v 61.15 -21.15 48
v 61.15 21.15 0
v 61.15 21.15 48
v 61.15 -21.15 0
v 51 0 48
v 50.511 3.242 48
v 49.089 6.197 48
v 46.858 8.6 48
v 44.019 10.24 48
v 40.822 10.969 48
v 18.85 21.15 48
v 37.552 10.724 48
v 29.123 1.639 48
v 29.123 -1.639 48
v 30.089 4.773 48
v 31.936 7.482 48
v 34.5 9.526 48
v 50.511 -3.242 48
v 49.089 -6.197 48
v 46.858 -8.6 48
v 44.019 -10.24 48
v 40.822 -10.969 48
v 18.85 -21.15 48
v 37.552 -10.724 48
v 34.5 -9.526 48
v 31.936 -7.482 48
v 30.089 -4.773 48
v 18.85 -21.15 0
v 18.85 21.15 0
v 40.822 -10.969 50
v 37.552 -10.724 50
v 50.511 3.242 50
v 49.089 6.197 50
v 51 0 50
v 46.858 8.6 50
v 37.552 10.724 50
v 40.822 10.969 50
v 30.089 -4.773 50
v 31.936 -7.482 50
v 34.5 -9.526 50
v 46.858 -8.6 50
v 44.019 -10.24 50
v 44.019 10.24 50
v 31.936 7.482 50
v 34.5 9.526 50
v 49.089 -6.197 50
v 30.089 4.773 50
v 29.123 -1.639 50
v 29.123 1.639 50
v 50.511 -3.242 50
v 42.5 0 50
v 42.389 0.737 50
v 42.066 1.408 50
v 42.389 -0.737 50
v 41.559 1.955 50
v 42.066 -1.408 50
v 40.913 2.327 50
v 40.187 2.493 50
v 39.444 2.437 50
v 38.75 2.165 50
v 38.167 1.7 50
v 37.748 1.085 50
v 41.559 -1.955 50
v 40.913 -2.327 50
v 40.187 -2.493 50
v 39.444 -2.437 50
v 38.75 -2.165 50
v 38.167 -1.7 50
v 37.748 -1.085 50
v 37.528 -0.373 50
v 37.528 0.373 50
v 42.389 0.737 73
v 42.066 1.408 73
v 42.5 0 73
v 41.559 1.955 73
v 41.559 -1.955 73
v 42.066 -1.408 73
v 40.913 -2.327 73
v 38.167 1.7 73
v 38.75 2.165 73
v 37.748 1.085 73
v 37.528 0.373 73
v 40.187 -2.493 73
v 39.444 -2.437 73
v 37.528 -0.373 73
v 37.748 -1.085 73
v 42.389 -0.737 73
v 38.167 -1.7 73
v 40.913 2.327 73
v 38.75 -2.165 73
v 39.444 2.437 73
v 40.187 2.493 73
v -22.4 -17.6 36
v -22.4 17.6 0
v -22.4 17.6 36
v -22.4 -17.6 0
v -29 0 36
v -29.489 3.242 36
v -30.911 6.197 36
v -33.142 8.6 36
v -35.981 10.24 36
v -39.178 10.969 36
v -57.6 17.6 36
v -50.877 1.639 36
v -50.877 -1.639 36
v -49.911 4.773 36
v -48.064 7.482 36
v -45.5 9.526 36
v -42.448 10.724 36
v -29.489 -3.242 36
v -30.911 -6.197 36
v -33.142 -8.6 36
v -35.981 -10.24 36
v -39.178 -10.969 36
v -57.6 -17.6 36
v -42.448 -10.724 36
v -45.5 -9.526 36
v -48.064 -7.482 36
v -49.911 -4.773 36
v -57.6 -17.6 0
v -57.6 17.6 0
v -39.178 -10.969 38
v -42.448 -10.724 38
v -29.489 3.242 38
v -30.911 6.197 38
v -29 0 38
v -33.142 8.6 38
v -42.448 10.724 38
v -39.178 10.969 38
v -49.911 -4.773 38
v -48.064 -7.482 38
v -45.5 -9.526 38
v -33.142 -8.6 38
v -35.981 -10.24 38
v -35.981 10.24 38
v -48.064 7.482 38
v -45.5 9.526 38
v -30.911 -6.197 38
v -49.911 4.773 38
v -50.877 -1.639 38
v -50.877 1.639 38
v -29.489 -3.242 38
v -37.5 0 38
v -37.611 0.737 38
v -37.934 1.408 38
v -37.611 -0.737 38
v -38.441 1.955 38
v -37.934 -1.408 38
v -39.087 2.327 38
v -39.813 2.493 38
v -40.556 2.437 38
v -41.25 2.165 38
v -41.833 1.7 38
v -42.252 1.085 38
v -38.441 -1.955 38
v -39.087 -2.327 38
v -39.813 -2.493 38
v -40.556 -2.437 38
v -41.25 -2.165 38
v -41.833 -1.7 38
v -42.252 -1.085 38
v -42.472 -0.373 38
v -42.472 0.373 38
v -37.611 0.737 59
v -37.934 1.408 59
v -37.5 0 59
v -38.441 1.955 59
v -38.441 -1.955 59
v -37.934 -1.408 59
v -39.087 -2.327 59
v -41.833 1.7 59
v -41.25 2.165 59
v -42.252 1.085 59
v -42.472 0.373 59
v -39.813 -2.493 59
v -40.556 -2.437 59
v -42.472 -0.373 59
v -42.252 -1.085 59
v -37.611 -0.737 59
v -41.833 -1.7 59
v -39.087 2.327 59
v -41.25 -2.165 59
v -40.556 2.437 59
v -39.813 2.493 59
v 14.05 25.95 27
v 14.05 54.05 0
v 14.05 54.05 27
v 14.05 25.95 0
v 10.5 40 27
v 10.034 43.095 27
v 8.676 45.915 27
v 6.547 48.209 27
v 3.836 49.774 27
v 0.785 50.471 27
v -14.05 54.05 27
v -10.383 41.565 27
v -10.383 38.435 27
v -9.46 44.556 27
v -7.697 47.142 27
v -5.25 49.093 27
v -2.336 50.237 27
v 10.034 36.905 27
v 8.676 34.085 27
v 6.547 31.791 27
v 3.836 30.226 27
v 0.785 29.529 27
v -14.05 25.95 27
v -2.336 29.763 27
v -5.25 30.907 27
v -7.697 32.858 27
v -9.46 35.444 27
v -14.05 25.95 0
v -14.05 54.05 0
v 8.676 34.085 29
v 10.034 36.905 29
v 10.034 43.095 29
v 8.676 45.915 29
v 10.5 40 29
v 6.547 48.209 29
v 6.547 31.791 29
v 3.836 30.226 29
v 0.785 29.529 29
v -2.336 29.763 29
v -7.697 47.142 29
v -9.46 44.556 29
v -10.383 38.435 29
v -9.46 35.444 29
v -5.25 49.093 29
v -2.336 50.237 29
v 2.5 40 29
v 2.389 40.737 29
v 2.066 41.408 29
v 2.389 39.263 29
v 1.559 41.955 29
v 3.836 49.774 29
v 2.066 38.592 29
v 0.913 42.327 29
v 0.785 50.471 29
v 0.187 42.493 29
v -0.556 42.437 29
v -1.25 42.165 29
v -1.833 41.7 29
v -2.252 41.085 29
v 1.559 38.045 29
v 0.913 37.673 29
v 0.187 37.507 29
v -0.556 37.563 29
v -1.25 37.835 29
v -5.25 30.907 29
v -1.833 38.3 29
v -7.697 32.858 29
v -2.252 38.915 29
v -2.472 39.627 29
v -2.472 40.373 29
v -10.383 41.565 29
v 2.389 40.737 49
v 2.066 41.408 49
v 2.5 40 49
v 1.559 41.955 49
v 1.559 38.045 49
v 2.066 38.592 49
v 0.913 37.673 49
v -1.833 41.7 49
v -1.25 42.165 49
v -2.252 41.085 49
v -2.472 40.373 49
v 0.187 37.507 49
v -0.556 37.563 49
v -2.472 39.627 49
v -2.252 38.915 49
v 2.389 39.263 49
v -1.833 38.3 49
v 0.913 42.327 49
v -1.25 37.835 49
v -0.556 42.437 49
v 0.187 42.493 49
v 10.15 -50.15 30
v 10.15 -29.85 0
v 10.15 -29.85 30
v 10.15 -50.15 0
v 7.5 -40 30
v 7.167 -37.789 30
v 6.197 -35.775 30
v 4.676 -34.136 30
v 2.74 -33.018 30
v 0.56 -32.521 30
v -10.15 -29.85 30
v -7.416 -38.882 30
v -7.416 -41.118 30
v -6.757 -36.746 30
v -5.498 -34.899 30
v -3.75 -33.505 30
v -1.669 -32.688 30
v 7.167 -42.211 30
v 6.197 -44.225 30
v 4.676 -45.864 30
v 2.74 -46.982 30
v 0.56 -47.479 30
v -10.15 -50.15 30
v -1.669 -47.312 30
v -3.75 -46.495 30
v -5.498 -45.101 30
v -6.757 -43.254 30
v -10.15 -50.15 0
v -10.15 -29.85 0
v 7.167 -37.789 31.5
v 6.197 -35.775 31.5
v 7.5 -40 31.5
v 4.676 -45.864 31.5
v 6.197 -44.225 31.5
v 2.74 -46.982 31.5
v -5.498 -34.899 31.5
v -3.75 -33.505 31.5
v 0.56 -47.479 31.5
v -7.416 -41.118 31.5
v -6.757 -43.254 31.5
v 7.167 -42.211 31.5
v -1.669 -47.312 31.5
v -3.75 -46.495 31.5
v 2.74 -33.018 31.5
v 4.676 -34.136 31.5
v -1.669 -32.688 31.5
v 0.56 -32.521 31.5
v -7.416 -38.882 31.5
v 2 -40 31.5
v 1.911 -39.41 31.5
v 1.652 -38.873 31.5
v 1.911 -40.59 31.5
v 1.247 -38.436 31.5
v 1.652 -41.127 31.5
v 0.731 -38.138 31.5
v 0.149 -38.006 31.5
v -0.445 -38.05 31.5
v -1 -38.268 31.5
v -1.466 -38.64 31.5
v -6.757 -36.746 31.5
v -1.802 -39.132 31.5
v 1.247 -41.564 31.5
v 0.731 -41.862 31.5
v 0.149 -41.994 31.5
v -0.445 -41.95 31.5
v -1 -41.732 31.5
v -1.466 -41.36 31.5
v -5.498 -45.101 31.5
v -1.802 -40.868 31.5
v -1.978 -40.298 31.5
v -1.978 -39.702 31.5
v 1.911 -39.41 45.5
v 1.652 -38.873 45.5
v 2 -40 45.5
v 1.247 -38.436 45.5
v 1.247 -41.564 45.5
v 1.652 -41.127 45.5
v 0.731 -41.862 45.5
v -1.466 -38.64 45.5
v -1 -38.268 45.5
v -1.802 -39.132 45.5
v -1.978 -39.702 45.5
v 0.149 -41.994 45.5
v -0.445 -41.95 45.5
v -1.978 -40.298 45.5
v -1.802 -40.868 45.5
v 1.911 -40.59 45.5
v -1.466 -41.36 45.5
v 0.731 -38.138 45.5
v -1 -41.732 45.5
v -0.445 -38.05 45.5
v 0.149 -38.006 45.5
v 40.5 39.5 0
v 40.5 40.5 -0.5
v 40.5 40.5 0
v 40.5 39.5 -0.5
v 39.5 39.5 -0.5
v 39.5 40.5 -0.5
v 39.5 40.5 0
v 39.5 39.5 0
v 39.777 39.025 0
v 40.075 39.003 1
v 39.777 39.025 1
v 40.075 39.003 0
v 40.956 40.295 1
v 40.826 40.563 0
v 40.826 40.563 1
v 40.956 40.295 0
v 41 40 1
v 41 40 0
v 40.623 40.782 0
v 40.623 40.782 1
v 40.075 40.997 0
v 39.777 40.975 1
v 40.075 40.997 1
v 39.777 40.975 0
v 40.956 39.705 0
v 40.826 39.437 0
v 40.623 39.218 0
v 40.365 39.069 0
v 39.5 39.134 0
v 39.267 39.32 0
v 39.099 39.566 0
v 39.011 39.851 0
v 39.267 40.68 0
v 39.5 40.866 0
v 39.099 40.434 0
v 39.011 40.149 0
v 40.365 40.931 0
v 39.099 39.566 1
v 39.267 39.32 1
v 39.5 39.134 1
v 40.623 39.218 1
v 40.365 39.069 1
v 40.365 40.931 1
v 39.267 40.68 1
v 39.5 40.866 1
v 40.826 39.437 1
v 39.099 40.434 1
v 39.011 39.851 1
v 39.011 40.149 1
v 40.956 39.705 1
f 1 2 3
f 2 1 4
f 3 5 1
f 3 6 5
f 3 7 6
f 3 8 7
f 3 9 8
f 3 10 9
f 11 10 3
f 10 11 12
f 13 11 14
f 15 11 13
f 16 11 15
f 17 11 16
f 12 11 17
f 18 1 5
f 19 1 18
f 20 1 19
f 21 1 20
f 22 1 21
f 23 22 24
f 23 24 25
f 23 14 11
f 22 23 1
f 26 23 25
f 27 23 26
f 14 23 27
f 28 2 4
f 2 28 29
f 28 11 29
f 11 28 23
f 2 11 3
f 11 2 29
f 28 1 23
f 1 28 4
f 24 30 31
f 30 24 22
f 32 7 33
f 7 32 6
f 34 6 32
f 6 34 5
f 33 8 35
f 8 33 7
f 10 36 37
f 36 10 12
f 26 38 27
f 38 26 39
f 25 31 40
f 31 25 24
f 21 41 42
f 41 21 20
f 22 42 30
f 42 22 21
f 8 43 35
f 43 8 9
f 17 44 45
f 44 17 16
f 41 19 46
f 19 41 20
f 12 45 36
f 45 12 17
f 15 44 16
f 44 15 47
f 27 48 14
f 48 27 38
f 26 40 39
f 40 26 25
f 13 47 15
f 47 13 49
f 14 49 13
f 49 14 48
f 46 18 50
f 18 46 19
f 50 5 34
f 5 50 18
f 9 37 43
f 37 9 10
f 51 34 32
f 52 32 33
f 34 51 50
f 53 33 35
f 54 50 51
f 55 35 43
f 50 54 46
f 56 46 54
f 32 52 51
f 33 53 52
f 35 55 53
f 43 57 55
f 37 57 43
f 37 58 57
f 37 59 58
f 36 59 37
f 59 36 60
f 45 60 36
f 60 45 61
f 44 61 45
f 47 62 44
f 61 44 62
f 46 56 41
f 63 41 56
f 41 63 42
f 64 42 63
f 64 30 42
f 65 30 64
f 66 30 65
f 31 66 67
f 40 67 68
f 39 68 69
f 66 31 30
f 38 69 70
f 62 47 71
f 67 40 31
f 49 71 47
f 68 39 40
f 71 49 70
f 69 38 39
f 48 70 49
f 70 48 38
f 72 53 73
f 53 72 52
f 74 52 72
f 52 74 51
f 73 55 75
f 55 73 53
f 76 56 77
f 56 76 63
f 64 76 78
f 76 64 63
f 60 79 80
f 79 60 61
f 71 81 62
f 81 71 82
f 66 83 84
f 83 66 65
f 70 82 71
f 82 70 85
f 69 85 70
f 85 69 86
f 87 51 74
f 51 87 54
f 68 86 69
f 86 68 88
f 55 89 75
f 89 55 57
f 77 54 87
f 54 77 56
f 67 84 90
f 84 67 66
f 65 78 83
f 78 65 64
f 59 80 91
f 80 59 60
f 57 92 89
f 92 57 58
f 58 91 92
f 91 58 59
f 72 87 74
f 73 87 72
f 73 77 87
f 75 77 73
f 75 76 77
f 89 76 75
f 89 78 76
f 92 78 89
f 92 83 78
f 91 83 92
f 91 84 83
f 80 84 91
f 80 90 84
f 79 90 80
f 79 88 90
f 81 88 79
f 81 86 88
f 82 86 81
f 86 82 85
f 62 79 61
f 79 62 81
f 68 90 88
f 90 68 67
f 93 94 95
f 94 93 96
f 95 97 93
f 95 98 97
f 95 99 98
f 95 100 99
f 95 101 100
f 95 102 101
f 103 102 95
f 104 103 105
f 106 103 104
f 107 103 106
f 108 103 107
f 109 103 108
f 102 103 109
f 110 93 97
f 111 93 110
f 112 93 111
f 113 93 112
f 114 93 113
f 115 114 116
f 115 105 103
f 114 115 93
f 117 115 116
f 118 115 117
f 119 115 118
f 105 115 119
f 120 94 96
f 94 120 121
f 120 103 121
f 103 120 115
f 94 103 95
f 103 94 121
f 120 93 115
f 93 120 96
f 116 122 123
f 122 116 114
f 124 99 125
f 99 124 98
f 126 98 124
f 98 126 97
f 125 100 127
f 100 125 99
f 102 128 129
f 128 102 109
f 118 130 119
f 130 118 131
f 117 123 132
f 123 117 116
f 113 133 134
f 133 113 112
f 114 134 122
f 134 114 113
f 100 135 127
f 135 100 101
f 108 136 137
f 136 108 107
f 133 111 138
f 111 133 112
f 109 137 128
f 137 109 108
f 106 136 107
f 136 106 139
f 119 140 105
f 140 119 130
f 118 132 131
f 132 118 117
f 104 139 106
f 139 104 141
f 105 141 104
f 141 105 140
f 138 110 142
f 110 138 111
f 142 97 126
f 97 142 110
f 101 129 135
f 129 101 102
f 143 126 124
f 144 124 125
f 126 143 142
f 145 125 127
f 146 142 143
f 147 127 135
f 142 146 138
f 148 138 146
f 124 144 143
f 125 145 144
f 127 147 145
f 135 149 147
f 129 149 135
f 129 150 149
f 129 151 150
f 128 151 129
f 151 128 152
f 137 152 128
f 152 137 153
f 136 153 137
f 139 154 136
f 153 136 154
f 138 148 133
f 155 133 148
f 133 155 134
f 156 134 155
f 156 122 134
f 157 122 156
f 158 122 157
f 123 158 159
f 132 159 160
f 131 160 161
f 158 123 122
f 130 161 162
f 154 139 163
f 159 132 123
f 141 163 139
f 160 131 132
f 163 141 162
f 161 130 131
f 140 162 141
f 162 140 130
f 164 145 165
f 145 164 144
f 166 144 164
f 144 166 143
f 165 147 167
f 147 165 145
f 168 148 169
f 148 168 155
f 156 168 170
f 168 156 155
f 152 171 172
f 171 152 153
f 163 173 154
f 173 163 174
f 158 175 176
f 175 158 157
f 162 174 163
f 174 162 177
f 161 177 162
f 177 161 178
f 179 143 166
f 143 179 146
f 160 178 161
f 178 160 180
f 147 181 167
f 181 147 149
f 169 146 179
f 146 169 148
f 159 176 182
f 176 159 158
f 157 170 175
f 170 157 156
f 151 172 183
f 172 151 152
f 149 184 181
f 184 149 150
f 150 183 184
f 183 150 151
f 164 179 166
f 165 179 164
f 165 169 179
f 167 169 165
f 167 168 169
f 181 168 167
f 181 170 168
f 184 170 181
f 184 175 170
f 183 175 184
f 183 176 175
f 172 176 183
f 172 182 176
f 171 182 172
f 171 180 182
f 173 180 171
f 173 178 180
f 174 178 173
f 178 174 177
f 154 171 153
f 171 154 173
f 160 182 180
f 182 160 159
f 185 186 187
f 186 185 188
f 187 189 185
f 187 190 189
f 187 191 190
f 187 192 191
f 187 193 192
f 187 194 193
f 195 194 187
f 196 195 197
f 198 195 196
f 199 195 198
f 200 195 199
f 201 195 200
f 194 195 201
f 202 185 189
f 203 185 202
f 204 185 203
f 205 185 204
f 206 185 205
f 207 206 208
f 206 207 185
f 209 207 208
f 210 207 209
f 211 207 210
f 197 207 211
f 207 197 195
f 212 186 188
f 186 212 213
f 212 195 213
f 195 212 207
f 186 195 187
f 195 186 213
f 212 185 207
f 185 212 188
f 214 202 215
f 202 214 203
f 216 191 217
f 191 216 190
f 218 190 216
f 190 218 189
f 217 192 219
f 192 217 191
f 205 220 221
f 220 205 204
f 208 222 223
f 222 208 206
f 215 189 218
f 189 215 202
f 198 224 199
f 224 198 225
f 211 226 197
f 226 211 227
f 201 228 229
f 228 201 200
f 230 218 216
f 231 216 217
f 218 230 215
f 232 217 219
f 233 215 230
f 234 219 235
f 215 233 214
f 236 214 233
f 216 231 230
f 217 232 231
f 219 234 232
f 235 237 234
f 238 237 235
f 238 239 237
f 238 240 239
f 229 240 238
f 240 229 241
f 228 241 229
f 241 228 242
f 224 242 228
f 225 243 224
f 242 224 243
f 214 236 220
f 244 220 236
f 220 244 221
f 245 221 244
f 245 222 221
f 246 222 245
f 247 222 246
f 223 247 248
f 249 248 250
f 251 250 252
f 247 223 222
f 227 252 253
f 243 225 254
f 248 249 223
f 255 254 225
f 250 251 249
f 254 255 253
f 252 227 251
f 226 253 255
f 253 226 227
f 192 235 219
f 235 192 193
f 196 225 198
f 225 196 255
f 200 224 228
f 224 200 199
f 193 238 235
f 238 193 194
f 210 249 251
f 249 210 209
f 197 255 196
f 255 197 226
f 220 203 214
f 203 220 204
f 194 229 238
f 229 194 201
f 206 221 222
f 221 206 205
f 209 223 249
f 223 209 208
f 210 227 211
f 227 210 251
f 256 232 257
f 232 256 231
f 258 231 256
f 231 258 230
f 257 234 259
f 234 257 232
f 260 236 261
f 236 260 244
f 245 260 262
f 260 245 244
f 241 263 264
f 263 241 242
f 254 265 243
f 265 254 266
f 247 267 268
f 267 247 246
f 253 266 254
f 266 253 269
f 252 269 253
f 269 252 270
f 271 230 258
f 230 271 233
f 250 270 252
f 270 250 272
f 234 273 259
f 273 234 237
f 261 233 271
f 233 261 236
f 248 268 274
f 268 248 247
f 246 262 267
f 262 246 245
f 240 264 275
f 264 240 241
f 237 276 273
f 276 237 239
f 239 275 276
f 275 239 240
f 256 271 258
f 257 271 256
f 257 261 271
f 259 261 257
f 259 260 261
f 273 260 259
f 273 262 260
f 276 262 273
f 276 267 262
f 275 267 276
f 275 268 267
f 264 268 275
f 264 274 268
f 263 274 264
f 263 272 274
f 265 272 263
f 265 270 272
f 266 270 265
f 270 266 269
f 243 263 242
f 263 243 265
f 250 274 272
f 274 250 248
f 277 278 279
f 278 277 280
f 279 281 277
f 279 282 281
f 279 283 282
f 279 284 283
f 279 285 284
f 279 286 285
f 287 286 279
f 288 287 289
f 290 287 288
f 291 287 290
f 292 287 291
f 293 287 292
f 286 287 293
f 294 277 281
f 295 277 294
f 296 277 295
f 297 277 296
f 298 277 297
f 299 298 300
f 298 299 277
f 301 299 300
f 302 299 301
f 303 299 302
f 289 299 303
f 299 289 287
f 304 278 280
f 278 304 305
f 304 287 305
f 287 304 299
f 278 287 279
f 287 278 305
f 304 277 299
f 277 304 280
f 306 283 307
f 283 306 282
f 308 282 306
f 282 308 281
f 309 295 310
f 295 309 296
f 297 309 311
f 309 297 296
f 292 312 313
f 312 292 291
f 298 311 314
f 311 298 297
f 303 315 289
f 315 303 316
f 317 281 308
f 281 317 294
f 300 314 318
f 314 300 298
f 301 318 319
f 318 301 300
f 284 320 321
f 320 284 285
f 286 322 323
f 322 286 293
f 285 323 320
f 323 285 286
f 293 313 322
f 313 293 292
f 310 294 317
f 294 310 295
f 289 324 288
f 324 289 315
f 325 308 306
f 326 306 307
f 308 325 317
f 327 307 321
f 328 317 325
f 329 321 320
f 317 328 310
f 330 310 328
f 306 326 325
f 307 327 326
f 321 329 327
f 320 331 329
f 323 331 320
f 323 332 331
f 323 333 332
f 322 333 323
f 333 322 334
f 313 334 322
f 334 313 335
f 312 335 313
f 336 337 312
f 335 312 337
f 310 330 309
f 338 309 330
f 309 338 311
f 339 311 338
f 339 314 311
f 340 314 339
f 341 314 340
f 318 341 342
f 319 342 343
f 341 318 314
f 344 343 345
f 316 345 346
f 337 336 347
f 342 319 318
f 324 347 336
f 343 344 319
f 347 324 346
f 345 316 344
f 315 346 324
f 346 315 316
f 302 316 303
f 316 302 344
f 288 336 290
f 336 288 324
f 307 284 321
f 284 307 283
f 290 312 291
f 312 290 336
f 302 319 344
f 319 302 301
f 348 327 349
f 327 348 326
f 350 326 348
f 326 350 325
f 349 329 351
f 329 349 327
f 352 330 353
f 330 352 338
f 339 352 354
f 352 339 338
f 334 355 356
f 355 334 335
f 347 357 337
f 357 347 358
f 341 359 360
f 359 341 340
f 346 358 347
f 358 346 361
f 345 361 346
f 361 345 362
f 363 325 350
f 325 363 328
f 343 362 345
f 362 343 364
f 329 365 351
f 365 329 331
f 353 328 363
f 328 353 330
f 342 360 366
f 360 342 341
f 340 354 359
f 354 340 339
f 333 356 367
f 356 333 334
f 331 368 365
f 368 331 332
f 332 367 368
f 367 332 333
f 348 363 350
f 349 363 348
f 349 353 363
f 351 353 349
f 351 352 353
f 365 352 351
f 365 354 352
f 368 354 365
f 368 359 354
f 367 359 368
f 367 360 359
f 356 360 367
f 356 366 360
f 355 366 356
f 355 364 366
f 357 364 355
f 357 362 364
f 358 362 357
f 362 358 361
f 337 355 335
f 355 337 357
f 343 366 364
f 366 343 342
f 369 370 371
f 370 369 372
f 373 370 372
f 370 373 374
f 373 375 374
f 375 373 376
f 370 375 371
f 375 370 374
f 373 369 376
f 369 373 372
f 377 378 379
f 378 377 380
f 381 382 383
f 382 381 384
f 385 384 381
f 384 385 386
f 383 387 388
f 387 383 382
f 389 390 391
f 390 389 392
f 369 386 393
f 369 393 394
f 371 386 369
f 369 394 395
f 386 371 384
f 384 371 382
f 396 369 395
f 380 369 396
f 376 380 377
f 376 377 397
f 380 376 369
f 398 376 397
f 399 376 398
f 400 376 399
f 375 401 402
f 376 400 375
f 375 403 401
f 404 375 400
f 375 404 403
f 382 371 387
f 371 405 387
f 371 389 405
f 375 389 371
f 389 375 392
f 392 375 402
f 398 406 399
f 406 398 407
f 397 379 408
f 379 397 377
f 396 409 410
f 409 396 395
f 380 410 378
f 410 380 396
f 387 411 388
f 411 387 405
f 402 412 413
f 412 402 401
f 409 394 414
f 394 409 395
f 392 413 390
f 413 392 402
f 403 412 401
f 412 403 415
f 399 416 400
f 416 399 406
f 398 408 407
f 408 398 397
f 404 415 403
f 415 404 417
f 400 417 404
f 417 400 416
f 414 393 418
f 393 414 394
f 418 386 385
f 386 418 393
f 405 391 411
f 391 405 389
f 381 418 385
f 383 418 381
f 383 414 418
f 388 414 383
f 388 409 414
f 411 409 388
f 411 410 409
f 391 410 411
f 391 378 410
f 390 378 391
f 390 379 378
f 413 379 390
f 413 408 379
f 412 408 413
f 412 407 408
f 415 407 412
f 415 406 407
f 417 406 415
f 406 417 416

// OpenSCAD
// file: ../scad/materials.scad
module aluminium(){
	color([1,1,1]*0.95) for(i=[1:$children]) child(i-1);
}
module aluminum(){
	color([1,1,1]*0.95) for(i=[1:$children]) child(i-1);
}
module bzp(){
    color([0.7,0.7,1]) for(i=[1:$children]) child(i-1);
}
module stainless(){
    color([1,1,1]*0.6) for(i=[1:$children]) child(i-1);
}
module steel(){
    color([1,1,1]*0.5) for(i=[1:$children]) child(i-1);
}
module urethane(){
    color([166/255,119/255,73/255]) for(i=[1:$children]) child(i-1);
}
// file: ../scad/functions.scad
include <hardware_dims.scad>

// Assign Screw array
function getScrewDims(screw) = (screw=="M2") ? m2 : (screw=="M2.5") ? m2_5 : (screw=="M3") ? m3 : (screw=="M4") ? m4 : (screw=="M5") ? m5 : (screw=="M6") ? m6 : (screw=="M8") ? m8 : "error";

function get_screw_dims(screw) = getScrewDims(screw);

function getStepperDims(motor) = (motor=="NEMA8") ? nema8 : (motor=="NEMA11") ? nema11 : (motor=="NEMA14") ? nema14 : (motor=="NEMA17") ? nema17 : (motor=="Pololu 35x26") ? pololu35x26 :"error";

function get_stepper_dims(motor) = getStepperDims(motor);

function getElectronicsHoles(electronics) = (electronics=="Melzi") ? melzi : (electronics=="Mega") ? mega : (electronics=="Printrboard") ? printrboard : (electronics=="Sanguinololu") ? sanguinololu :"error";

function get_electronics_holes(electronics) = getElectronicsHoles(electronics);

function getExtruderGearDims(extruderGear) = (extruderGear=="Arcol8x5") ? arcol8x5 : (extruderGear=="Arcol11x8") ? arcol11x8 : (extruderGear=="Arcol11x5") ? arcol11x5 : (extruderGear=="Arcol13x8") ? arcol13x8 : "error";

function get_extruder_gear_dims(extruderGear) = getExtruderGearDims(extruderGear);

function get_drive_roller_dims(roller) = (roller == "A_7T_5MUR1405") ? A_7T_5MUR1405 : (roller == "A_7T_5MUR1606") ? A_7T_5MUR1606 : (roller == "A_7T_5MUR1905") ? A_7T_5MUR1905 : (roller == "A_7T_5MUR1906") ? A_7T_5MUR1906 : (roller == "A_7T_5MUR2206") ? A_7T_5MUR2206 : (roller == "A_7T_5MUR2510") ? A_7T_5MUR2510 : (roller == "A_7T_5MUR3210") ? A_7T_5MUR3210 : (roller == "A_7T_5MUR3810") ? A_7T_5MUR3810 : (roller == "A_7T_5MUR3812") ? A_7T_5MUR3812 : (roller == "A_7T_5MUR4412") ? A_7T_5MUR4412 : (roller == "A_7T_5MUR5012") ? A_7T_5MUR5012 : (roller == "A_7M_5MUR1206A") ? A_7M_5MUR1206A : (roller == "A_7M_5MUR1206B") ? A_7M_5MUR1206B : "error";
// file: ../scad/hardware_dims.scad
//Screw Dimension arrays
//[Diameter, Cap Head Height, Head Diameter, nut across flats, lock nut height, nut height, washer od, washer thick, pan head diameter]
m2 = [2, 2, 3.8, 4, 2.8, 1.6, 5, 0.3, 4];
m2_5 = [2.5, 2.5, 4.5, 5, 3.8, 2, 6, 0.5, 5];
m3 = [3, 3, 5.5, 5.5, 4, 2.4, 7, 0.6, 6];
m4 = [4, 4, 7, 7, 5, 3.2, 9, 0.9, 8];
m5 = [5, 5, 8.5, 8, 5, 4, 10, 1.1, 10];
m6 = [6, 6, 10, 10, 6, 5, 12.5, 1.8, 12];
m8 = [8, 8, 13, 13, 8, 6.5, 17, 1.8, 16];

//stepper dimension arrays
//[width, length, hole spacing, hole diameter, flange diameter, flange height, shaft length, shaft diameter]
nema8 = [20.3, 30, 16, 2, 15, 1.5, 14, 4];
nema11 = [28.1, 27, 23, 2.5, 21, 2, 20, 5];
nema14 = [35.2, 36, 26, 3, 22, 2, 21, 5];
nema17 = [42.3, 48, 31, 3, 22, 2, 23, 5];
pololu35x26 = [35.2, 26, 26, 3, 22, 2, 21, 5];

//electronics dimension arrays
//[[x,y,z],etc..]
melzi = [[0,0,0],[200,0,0],[0,42,0],[200,42,0]];
mega = [[0,0,0],[80,0,0],[1.3,48.3,0],[76.2,48.3,0]];//TODO: second entry needs fixing
printrboard = [[0,0,0],[91,0,0],[0,52.75,0],[91,52.75,0]];
sanguinololu = [[0,0,0],[94,0,0],[0,44,0],[94,44,0]];

//extruder drive gear dimensions arrays
//[outer diameter, length, inner diameter, hobb diameter, teeth diameter(torus inside to inside), teeth offset(from bottom)]
arcol8x5 = [8,13,5,5,6,5];
arcol11x5 = [11.1,13,5,5,9.1,6];
arcol11x8 = [11.1,13,8,5,9.1,6];
arcol13x8 = [13.3,13,8,5,11.3,6];


//Feed roller with hub 
// [Outside dia, bore, face width, hub projection, hub diameter]
A_7T_5MUR1405 = [14,5,6.35,6.35,11.1];
A_7T_5MUR1606 = [16,6,9.52,6.35,12.7];
A_7T_5MUR1905 = [19,5,6.35,6.35,11.1];
A_7T_5MUR1906 = [19,6,9.52,6.35,12.7];
A_7T_5MUR2206 = [22,6,9.52,6.35,12.7];
A_7T_5MUR2510 = [25,10,9.52,9.52,19];
A_7T_5MUR3210 = [32,10,9.52,9.52,20.62];
A_7T_5MUR3810 = [38,10,9.52,9.52,25.4];
A_7T_5MUR3812 = [38,12,12.7,12.7,25.4];
A_7T_5MUR4412 = [44,12,12.7,12.7,31.75];
A_7T_5MUR5012 = [50,12,12.7,12.7,34.9];

//hubless feed roller
// [outside dia, bore, face width, 0(use same constructor as above), sleeve diameter]
A_7M_5MUR1206A = [12, 6, 6.35, 0, 8.74];
A_7M_5MUR1206B = [12, 6, 18.2, 0, 8.74];
A_7M_5MUR1206C = [12, 6, 12.7, 0, 8.74];
A_7M_5MUR1710 = [17, 10, 6.35, 0, 12.7];
A_7M_5MUR1910 = [19, 10, 12.7, 0, 12.7];
A_7M_5MUR2010 = [20, 10, 12.7, 0, 12.7];
A_7M_5MUR2310 = [23, 10, 12.3, 0, 17.47];
A_7M_5MUR2810A = [28, 10, 11.12, 0, 12.7];
A_7M_5MUR2810B = [28, 10, 17.47, 0, 12.7];
A_7M_5MUR5010 = [50, 10, 17.47, 0, 34.92];
A_7M_5MUR5012A = [50, 12, 19.05, 0, 34.92];	
A_7M_5MUR5012B = [50, 12, 25.4, 0, 34.92];
// file: ../scad/constants.scad
//array positions
//screw
DIAMETER = 0;
CAP_HEAD_HEIGHT = 1;
CAP_HEAD_DIAMETER = 2;
NUT_WIDTH = 3;
LOCK_NUT_HEIGHT = 4;
NUT_HEIGHT = 5;
WASHER_OD = 6;
WASHER_HEIGHT = 7;
PAN_HEAD_DIAMETER = 8;
PAN_HEAD_HEIGHT = 5; //generally within 0.1mm of a nut height, so just use that

//stepper
WIDTH = 0;
LENGTH = 1;
HOLE_SPACING = 2;
HOLE_DIAMETER = 3;
FLANGE_DIAMETER = 4;
FLANGE_HEIGHT = 5;
SHAFT_LENGTH = 6;
SHAFT_DIAMETER = 7;

//extruder drive gear
OUTER_DIAMETER = 0;
INNER_DIAMETER = 0;
HOBB_DIAMETER = 0;
TEETH_DIAMETER = 0;
TEETH_OFFSET = 0;

//Feed Rollers
OUTSIDE_DIAMETER = 0;
BORE_SIZE = 1;
FACE_WIDTH = 2;
HUB_PROJECTION = 3;
HUB_DIAMETER = 4;

//constants
pi = 3.14159;
phi = 1.618;
eta = 0.1; //used to eliminate coincident faces
MAGPIE_OUT = "MAGPIE: ";
// file: ../scad/components.scad
include <hardware_dims.scad>
include <polyholes.scad>
include <constants.scad>
include <functions.scad>
include <materials.scad>

$fn = 21;

module nut(type){
	a = getScrewDims(type);

	difference(type){
		union(){
			stainless()cylinder(r = a[NUT_WIDTH]/cos(30)/2, h = a[NUT_HEIGHT], $fn = 6);
		}
		stainless()translate([0,0,-eta])cylinder(r = a[DIAMETER]/2, h = a[NUT_HEIGHT] + eta * 2);
	}
	echo(str(MAGPIE_OUT, type," nut")); 
}

module lockNut(type){
	a = getScrewDims(type);

	difference(){
		union(){
			stainless()cylinder(r = a[NUT_WIDTH]/cos(30)/2, h = a[LOCK_NUT_HEIGHT]-a[NUT_WIDTH]/4, $fn = 6);
			stainless()translate([0,0,a[LOCK_NUT_HEIGHT]-a[NUT_WIDTH]/4])
				rotate_extrude(convexity = 10)translate([a[NUT_WIDTH]/4,0,0])circle(r = a[NUT_WIDTH]/4);
		}
		stainless()translate([0,0,-eta])cylinder(r=a[DIAMETER]/2, h = a[LOCK_NUT_HEIGHT] + eta*2);
	}
	echo(str(MAGPIE_OUT, type," lock nut")); 
}

module lock_nut(type){
	lockNut(type);
}

module stepper(type){
	a = getStepperDims(type);

		union(){
			steel()translate([0,0,a[LENGTH]/2])cube([a[WIDTH], a[WIDTH], a[LENGTH]], center = true);
			steel()translate([0,0,a[LENGTH]])cylinder(r=a[FLANGE_DIAMETER]/2, h = a[FLANGE_HEIGHT]);
			stainless()translate([0,0,a[LENGTH]+a[FLANGE_HEIGHT]])cylinder(r=a[SHAFT_DIAMETER]/2, h = a[SHAFT_LENGTH]);
		}
	echo(str(MAGPIE_OUT, type," stepper")); 
}

module capScrew(type,length){
	a = getScrewDims(type);

	difference(){
		union(){
			steel()translate([0,0,-a[CAP_HEAD_HEIGHT]])
				cylinder(r = a[CAP_HEAD_DIAMETER]/2, h = a[CAP_HEAD_HEIGHT]);
			steel()cylinder(r = a[DIAMETER]/2, h = round(length));
			
		}
		//make a socket for aesthetics
		steel()translate([0,0,-a[CAP_HEAD_HEIGHT]-eta])
			cylinder(r = a[CAP_HEAD_DIAMETER]/4, h = a[CAP_HEAD_HEIGHT] * 3/4, $fn = 6);
	}
	echo(str(MAGPIE_OUT, type, "x", round(length), " cap screw")); 
}

module cap_screw(type, length){
	capScrew(type,length);
}

module hexScrew(type,length){
	a = getScrewDims(type);

	union(){
		steel()translate([0,0,-a[NUT_HEIGHT]])
			cylinder(r = a[NUT_WIDTH]/cos(30)/2, h = a[NUT_HEIGHT], $fn = 6);
		steel()cylinder(r = a[DIAMETER]/2, h = round(length));
		
	}

	echo(str(MAGPIE_OUT, type, "x", round(length), " hex screw")); 
}

module hex_screw(type, length){
	hexScrew(type,length);
}

module setScrew(type,length){
	a = getScrewDims(type);

	difference(){
		union(){
			steel()cylinder(r = a[DIAMETER]/2, h = round(length));
		}
		//make a socket for aesthetics
		steel()translate([0,0,-eta])
			cylinder(r = a[CAP_HEAD_DIAMETER]/5, h = a[CAP_HEAD_HEIGHT] * 3/4, $fn = 6);
	}
	echo(str(MAGPIE_OUT, type, "x", round(length), " set screw")); 
}

module set_screw(type, length){
	setScrew(type,length);
}

module flatWasher(type){
	a = getScrewDims(type);

	difference(){
		union(){
			stainless()cylinder(r = a[WASHER_OD]/2, h = a[WASHER_HEIGHT]);
		}
		stainless()translate([0,0,-eta])cylinder(r = a[DIAMETER]/2, h = a[WASHER_HEIGHT] + eta * 2);
	}
	echo(str(MAGPIE_OUT, type," flat washer")); 
}

module flat_washer(type){
	flatWasher(type);
}

module allThread(type, length){
	a = getScrewDims(type);

	//don't round up on all thread
	difference(){
		union(){
			steel()cylinder(r = a[DIAMETER]/2, h = round(length));
		}
	}
	echo(str(MAGPIE_OUT, type, "x", round(length), " threaded rod")); 
}

module all_thread(type,length){
	allThread(type,length);
}

module extruderGear(type){
	lextruder_gear_array = get_extruder_gear_dims(type);

	
	lextruder_gear_od = lextruder_gear_array[0];
	lextruder_gear_id = lextruder_gear_array[1];
	lextruder_gear_hobb_diameter = lextruder_gear_array[2];
	lextruder_gear_teeth_diameter = lextruder_gear_array[3];
	lextruder_gear_teeth_offset = lextruder_gear_array[4];
	lextruder_gear_height = lextruder_gear_array[5];

	color("silver")difference(){
		color("silver")union(){
			translate([0,0,-lextruder_gear_teeth_offset])cylinder(r=lextruder_gear_od/2, h=lextruder_gear_height);
		}
		translate([0,0,-eta-lextruder_gear_teeth_offset])cylinder(r=lextruder_gear_id/2, h=lextruder_gear_height+eta*2);
		rotate_extrude(convexity = 10)translate([lextruder_gear_hobb_diameter/2+lextruder_gear_teeth_diameter/2,0,0])circle(r = lextruder_gear_teeth_diameter/2);
	}
	echo(str(MAGPIE_OUT, type, " hobbed extruder drive gear")); 
}

module ptfeRod(radius,length){
	difference(){
		union(){
			color("white")cylinder(r = radius, h = round(length));
		}
	}
	echo(str(MAGPIE_OUT,radius*2,"mm diameter ", round(length), "mm long PTFE rod")); 
}

module ptfe_rod(radius, length){
	ptfeRod(radius, length);
}
// file: ../scad/polyholes.scad
//
// Mendel90
//
// GNU GPL v2
// nop.head@gmail.com
// hydraraptor.blogspot.com
//
// See http://hydraraptor.blogspot.com/2011/02/polyholes.html
//
function sides(r) = max(round(4 *r),3);
function correctedRadius(r,n) = 0.1 + r / cos(180 / n);
function correctedDiameter(d) = 0.2 + d / cos(180 / sides(d / 2));

module polyCircle(r, center = false) {
    n = sides(r);
    circle(r = correctedRadius(r,n), $fn = n, center = center);
}

module poly_circle(r, center = false) {
	polyCircle(r, center);
}

module polyCylinder(r, h, center = false) {
    n = sides(r);
    cylinder(h = h, r = correctedRadius(r,n), $fn = n, center = center);
}

module poly_cylinder(r, h, center = false) {
	polyCylinder(r,h,center);
}

module polydCylinder(r, center = false) {
    n = sides(r);
    r = correctedRadius(r,n);
    cylinder(h = h, r = r, $fn = n, center = center);
    translate([0, -r, 0])
        cube([r, 2 * r, h]);
}

module poly_d_cylinder(r, center = false) {
	polydCylinder(r,center);
}
// file: ../magpie.scad
//Use all the things
use <./scad/polyholes.scad>
use <./scad/components.scad>
include <./scad/constants.scad>
include <./scad/hardware_dims.scad>
include <./scad/functions.scad>
// main file
include <../magpie.scad>

//stepper tests
translate([40,0,0])stepper("NEMA17");
translate([-40,0,0])stepper("NEMA14");
translate([0,40,0])stepper("NEMA11");
translate([0,-40,0])stepper("NEMA8");
translate([40,40,0])stepper("Pololu35x26");
